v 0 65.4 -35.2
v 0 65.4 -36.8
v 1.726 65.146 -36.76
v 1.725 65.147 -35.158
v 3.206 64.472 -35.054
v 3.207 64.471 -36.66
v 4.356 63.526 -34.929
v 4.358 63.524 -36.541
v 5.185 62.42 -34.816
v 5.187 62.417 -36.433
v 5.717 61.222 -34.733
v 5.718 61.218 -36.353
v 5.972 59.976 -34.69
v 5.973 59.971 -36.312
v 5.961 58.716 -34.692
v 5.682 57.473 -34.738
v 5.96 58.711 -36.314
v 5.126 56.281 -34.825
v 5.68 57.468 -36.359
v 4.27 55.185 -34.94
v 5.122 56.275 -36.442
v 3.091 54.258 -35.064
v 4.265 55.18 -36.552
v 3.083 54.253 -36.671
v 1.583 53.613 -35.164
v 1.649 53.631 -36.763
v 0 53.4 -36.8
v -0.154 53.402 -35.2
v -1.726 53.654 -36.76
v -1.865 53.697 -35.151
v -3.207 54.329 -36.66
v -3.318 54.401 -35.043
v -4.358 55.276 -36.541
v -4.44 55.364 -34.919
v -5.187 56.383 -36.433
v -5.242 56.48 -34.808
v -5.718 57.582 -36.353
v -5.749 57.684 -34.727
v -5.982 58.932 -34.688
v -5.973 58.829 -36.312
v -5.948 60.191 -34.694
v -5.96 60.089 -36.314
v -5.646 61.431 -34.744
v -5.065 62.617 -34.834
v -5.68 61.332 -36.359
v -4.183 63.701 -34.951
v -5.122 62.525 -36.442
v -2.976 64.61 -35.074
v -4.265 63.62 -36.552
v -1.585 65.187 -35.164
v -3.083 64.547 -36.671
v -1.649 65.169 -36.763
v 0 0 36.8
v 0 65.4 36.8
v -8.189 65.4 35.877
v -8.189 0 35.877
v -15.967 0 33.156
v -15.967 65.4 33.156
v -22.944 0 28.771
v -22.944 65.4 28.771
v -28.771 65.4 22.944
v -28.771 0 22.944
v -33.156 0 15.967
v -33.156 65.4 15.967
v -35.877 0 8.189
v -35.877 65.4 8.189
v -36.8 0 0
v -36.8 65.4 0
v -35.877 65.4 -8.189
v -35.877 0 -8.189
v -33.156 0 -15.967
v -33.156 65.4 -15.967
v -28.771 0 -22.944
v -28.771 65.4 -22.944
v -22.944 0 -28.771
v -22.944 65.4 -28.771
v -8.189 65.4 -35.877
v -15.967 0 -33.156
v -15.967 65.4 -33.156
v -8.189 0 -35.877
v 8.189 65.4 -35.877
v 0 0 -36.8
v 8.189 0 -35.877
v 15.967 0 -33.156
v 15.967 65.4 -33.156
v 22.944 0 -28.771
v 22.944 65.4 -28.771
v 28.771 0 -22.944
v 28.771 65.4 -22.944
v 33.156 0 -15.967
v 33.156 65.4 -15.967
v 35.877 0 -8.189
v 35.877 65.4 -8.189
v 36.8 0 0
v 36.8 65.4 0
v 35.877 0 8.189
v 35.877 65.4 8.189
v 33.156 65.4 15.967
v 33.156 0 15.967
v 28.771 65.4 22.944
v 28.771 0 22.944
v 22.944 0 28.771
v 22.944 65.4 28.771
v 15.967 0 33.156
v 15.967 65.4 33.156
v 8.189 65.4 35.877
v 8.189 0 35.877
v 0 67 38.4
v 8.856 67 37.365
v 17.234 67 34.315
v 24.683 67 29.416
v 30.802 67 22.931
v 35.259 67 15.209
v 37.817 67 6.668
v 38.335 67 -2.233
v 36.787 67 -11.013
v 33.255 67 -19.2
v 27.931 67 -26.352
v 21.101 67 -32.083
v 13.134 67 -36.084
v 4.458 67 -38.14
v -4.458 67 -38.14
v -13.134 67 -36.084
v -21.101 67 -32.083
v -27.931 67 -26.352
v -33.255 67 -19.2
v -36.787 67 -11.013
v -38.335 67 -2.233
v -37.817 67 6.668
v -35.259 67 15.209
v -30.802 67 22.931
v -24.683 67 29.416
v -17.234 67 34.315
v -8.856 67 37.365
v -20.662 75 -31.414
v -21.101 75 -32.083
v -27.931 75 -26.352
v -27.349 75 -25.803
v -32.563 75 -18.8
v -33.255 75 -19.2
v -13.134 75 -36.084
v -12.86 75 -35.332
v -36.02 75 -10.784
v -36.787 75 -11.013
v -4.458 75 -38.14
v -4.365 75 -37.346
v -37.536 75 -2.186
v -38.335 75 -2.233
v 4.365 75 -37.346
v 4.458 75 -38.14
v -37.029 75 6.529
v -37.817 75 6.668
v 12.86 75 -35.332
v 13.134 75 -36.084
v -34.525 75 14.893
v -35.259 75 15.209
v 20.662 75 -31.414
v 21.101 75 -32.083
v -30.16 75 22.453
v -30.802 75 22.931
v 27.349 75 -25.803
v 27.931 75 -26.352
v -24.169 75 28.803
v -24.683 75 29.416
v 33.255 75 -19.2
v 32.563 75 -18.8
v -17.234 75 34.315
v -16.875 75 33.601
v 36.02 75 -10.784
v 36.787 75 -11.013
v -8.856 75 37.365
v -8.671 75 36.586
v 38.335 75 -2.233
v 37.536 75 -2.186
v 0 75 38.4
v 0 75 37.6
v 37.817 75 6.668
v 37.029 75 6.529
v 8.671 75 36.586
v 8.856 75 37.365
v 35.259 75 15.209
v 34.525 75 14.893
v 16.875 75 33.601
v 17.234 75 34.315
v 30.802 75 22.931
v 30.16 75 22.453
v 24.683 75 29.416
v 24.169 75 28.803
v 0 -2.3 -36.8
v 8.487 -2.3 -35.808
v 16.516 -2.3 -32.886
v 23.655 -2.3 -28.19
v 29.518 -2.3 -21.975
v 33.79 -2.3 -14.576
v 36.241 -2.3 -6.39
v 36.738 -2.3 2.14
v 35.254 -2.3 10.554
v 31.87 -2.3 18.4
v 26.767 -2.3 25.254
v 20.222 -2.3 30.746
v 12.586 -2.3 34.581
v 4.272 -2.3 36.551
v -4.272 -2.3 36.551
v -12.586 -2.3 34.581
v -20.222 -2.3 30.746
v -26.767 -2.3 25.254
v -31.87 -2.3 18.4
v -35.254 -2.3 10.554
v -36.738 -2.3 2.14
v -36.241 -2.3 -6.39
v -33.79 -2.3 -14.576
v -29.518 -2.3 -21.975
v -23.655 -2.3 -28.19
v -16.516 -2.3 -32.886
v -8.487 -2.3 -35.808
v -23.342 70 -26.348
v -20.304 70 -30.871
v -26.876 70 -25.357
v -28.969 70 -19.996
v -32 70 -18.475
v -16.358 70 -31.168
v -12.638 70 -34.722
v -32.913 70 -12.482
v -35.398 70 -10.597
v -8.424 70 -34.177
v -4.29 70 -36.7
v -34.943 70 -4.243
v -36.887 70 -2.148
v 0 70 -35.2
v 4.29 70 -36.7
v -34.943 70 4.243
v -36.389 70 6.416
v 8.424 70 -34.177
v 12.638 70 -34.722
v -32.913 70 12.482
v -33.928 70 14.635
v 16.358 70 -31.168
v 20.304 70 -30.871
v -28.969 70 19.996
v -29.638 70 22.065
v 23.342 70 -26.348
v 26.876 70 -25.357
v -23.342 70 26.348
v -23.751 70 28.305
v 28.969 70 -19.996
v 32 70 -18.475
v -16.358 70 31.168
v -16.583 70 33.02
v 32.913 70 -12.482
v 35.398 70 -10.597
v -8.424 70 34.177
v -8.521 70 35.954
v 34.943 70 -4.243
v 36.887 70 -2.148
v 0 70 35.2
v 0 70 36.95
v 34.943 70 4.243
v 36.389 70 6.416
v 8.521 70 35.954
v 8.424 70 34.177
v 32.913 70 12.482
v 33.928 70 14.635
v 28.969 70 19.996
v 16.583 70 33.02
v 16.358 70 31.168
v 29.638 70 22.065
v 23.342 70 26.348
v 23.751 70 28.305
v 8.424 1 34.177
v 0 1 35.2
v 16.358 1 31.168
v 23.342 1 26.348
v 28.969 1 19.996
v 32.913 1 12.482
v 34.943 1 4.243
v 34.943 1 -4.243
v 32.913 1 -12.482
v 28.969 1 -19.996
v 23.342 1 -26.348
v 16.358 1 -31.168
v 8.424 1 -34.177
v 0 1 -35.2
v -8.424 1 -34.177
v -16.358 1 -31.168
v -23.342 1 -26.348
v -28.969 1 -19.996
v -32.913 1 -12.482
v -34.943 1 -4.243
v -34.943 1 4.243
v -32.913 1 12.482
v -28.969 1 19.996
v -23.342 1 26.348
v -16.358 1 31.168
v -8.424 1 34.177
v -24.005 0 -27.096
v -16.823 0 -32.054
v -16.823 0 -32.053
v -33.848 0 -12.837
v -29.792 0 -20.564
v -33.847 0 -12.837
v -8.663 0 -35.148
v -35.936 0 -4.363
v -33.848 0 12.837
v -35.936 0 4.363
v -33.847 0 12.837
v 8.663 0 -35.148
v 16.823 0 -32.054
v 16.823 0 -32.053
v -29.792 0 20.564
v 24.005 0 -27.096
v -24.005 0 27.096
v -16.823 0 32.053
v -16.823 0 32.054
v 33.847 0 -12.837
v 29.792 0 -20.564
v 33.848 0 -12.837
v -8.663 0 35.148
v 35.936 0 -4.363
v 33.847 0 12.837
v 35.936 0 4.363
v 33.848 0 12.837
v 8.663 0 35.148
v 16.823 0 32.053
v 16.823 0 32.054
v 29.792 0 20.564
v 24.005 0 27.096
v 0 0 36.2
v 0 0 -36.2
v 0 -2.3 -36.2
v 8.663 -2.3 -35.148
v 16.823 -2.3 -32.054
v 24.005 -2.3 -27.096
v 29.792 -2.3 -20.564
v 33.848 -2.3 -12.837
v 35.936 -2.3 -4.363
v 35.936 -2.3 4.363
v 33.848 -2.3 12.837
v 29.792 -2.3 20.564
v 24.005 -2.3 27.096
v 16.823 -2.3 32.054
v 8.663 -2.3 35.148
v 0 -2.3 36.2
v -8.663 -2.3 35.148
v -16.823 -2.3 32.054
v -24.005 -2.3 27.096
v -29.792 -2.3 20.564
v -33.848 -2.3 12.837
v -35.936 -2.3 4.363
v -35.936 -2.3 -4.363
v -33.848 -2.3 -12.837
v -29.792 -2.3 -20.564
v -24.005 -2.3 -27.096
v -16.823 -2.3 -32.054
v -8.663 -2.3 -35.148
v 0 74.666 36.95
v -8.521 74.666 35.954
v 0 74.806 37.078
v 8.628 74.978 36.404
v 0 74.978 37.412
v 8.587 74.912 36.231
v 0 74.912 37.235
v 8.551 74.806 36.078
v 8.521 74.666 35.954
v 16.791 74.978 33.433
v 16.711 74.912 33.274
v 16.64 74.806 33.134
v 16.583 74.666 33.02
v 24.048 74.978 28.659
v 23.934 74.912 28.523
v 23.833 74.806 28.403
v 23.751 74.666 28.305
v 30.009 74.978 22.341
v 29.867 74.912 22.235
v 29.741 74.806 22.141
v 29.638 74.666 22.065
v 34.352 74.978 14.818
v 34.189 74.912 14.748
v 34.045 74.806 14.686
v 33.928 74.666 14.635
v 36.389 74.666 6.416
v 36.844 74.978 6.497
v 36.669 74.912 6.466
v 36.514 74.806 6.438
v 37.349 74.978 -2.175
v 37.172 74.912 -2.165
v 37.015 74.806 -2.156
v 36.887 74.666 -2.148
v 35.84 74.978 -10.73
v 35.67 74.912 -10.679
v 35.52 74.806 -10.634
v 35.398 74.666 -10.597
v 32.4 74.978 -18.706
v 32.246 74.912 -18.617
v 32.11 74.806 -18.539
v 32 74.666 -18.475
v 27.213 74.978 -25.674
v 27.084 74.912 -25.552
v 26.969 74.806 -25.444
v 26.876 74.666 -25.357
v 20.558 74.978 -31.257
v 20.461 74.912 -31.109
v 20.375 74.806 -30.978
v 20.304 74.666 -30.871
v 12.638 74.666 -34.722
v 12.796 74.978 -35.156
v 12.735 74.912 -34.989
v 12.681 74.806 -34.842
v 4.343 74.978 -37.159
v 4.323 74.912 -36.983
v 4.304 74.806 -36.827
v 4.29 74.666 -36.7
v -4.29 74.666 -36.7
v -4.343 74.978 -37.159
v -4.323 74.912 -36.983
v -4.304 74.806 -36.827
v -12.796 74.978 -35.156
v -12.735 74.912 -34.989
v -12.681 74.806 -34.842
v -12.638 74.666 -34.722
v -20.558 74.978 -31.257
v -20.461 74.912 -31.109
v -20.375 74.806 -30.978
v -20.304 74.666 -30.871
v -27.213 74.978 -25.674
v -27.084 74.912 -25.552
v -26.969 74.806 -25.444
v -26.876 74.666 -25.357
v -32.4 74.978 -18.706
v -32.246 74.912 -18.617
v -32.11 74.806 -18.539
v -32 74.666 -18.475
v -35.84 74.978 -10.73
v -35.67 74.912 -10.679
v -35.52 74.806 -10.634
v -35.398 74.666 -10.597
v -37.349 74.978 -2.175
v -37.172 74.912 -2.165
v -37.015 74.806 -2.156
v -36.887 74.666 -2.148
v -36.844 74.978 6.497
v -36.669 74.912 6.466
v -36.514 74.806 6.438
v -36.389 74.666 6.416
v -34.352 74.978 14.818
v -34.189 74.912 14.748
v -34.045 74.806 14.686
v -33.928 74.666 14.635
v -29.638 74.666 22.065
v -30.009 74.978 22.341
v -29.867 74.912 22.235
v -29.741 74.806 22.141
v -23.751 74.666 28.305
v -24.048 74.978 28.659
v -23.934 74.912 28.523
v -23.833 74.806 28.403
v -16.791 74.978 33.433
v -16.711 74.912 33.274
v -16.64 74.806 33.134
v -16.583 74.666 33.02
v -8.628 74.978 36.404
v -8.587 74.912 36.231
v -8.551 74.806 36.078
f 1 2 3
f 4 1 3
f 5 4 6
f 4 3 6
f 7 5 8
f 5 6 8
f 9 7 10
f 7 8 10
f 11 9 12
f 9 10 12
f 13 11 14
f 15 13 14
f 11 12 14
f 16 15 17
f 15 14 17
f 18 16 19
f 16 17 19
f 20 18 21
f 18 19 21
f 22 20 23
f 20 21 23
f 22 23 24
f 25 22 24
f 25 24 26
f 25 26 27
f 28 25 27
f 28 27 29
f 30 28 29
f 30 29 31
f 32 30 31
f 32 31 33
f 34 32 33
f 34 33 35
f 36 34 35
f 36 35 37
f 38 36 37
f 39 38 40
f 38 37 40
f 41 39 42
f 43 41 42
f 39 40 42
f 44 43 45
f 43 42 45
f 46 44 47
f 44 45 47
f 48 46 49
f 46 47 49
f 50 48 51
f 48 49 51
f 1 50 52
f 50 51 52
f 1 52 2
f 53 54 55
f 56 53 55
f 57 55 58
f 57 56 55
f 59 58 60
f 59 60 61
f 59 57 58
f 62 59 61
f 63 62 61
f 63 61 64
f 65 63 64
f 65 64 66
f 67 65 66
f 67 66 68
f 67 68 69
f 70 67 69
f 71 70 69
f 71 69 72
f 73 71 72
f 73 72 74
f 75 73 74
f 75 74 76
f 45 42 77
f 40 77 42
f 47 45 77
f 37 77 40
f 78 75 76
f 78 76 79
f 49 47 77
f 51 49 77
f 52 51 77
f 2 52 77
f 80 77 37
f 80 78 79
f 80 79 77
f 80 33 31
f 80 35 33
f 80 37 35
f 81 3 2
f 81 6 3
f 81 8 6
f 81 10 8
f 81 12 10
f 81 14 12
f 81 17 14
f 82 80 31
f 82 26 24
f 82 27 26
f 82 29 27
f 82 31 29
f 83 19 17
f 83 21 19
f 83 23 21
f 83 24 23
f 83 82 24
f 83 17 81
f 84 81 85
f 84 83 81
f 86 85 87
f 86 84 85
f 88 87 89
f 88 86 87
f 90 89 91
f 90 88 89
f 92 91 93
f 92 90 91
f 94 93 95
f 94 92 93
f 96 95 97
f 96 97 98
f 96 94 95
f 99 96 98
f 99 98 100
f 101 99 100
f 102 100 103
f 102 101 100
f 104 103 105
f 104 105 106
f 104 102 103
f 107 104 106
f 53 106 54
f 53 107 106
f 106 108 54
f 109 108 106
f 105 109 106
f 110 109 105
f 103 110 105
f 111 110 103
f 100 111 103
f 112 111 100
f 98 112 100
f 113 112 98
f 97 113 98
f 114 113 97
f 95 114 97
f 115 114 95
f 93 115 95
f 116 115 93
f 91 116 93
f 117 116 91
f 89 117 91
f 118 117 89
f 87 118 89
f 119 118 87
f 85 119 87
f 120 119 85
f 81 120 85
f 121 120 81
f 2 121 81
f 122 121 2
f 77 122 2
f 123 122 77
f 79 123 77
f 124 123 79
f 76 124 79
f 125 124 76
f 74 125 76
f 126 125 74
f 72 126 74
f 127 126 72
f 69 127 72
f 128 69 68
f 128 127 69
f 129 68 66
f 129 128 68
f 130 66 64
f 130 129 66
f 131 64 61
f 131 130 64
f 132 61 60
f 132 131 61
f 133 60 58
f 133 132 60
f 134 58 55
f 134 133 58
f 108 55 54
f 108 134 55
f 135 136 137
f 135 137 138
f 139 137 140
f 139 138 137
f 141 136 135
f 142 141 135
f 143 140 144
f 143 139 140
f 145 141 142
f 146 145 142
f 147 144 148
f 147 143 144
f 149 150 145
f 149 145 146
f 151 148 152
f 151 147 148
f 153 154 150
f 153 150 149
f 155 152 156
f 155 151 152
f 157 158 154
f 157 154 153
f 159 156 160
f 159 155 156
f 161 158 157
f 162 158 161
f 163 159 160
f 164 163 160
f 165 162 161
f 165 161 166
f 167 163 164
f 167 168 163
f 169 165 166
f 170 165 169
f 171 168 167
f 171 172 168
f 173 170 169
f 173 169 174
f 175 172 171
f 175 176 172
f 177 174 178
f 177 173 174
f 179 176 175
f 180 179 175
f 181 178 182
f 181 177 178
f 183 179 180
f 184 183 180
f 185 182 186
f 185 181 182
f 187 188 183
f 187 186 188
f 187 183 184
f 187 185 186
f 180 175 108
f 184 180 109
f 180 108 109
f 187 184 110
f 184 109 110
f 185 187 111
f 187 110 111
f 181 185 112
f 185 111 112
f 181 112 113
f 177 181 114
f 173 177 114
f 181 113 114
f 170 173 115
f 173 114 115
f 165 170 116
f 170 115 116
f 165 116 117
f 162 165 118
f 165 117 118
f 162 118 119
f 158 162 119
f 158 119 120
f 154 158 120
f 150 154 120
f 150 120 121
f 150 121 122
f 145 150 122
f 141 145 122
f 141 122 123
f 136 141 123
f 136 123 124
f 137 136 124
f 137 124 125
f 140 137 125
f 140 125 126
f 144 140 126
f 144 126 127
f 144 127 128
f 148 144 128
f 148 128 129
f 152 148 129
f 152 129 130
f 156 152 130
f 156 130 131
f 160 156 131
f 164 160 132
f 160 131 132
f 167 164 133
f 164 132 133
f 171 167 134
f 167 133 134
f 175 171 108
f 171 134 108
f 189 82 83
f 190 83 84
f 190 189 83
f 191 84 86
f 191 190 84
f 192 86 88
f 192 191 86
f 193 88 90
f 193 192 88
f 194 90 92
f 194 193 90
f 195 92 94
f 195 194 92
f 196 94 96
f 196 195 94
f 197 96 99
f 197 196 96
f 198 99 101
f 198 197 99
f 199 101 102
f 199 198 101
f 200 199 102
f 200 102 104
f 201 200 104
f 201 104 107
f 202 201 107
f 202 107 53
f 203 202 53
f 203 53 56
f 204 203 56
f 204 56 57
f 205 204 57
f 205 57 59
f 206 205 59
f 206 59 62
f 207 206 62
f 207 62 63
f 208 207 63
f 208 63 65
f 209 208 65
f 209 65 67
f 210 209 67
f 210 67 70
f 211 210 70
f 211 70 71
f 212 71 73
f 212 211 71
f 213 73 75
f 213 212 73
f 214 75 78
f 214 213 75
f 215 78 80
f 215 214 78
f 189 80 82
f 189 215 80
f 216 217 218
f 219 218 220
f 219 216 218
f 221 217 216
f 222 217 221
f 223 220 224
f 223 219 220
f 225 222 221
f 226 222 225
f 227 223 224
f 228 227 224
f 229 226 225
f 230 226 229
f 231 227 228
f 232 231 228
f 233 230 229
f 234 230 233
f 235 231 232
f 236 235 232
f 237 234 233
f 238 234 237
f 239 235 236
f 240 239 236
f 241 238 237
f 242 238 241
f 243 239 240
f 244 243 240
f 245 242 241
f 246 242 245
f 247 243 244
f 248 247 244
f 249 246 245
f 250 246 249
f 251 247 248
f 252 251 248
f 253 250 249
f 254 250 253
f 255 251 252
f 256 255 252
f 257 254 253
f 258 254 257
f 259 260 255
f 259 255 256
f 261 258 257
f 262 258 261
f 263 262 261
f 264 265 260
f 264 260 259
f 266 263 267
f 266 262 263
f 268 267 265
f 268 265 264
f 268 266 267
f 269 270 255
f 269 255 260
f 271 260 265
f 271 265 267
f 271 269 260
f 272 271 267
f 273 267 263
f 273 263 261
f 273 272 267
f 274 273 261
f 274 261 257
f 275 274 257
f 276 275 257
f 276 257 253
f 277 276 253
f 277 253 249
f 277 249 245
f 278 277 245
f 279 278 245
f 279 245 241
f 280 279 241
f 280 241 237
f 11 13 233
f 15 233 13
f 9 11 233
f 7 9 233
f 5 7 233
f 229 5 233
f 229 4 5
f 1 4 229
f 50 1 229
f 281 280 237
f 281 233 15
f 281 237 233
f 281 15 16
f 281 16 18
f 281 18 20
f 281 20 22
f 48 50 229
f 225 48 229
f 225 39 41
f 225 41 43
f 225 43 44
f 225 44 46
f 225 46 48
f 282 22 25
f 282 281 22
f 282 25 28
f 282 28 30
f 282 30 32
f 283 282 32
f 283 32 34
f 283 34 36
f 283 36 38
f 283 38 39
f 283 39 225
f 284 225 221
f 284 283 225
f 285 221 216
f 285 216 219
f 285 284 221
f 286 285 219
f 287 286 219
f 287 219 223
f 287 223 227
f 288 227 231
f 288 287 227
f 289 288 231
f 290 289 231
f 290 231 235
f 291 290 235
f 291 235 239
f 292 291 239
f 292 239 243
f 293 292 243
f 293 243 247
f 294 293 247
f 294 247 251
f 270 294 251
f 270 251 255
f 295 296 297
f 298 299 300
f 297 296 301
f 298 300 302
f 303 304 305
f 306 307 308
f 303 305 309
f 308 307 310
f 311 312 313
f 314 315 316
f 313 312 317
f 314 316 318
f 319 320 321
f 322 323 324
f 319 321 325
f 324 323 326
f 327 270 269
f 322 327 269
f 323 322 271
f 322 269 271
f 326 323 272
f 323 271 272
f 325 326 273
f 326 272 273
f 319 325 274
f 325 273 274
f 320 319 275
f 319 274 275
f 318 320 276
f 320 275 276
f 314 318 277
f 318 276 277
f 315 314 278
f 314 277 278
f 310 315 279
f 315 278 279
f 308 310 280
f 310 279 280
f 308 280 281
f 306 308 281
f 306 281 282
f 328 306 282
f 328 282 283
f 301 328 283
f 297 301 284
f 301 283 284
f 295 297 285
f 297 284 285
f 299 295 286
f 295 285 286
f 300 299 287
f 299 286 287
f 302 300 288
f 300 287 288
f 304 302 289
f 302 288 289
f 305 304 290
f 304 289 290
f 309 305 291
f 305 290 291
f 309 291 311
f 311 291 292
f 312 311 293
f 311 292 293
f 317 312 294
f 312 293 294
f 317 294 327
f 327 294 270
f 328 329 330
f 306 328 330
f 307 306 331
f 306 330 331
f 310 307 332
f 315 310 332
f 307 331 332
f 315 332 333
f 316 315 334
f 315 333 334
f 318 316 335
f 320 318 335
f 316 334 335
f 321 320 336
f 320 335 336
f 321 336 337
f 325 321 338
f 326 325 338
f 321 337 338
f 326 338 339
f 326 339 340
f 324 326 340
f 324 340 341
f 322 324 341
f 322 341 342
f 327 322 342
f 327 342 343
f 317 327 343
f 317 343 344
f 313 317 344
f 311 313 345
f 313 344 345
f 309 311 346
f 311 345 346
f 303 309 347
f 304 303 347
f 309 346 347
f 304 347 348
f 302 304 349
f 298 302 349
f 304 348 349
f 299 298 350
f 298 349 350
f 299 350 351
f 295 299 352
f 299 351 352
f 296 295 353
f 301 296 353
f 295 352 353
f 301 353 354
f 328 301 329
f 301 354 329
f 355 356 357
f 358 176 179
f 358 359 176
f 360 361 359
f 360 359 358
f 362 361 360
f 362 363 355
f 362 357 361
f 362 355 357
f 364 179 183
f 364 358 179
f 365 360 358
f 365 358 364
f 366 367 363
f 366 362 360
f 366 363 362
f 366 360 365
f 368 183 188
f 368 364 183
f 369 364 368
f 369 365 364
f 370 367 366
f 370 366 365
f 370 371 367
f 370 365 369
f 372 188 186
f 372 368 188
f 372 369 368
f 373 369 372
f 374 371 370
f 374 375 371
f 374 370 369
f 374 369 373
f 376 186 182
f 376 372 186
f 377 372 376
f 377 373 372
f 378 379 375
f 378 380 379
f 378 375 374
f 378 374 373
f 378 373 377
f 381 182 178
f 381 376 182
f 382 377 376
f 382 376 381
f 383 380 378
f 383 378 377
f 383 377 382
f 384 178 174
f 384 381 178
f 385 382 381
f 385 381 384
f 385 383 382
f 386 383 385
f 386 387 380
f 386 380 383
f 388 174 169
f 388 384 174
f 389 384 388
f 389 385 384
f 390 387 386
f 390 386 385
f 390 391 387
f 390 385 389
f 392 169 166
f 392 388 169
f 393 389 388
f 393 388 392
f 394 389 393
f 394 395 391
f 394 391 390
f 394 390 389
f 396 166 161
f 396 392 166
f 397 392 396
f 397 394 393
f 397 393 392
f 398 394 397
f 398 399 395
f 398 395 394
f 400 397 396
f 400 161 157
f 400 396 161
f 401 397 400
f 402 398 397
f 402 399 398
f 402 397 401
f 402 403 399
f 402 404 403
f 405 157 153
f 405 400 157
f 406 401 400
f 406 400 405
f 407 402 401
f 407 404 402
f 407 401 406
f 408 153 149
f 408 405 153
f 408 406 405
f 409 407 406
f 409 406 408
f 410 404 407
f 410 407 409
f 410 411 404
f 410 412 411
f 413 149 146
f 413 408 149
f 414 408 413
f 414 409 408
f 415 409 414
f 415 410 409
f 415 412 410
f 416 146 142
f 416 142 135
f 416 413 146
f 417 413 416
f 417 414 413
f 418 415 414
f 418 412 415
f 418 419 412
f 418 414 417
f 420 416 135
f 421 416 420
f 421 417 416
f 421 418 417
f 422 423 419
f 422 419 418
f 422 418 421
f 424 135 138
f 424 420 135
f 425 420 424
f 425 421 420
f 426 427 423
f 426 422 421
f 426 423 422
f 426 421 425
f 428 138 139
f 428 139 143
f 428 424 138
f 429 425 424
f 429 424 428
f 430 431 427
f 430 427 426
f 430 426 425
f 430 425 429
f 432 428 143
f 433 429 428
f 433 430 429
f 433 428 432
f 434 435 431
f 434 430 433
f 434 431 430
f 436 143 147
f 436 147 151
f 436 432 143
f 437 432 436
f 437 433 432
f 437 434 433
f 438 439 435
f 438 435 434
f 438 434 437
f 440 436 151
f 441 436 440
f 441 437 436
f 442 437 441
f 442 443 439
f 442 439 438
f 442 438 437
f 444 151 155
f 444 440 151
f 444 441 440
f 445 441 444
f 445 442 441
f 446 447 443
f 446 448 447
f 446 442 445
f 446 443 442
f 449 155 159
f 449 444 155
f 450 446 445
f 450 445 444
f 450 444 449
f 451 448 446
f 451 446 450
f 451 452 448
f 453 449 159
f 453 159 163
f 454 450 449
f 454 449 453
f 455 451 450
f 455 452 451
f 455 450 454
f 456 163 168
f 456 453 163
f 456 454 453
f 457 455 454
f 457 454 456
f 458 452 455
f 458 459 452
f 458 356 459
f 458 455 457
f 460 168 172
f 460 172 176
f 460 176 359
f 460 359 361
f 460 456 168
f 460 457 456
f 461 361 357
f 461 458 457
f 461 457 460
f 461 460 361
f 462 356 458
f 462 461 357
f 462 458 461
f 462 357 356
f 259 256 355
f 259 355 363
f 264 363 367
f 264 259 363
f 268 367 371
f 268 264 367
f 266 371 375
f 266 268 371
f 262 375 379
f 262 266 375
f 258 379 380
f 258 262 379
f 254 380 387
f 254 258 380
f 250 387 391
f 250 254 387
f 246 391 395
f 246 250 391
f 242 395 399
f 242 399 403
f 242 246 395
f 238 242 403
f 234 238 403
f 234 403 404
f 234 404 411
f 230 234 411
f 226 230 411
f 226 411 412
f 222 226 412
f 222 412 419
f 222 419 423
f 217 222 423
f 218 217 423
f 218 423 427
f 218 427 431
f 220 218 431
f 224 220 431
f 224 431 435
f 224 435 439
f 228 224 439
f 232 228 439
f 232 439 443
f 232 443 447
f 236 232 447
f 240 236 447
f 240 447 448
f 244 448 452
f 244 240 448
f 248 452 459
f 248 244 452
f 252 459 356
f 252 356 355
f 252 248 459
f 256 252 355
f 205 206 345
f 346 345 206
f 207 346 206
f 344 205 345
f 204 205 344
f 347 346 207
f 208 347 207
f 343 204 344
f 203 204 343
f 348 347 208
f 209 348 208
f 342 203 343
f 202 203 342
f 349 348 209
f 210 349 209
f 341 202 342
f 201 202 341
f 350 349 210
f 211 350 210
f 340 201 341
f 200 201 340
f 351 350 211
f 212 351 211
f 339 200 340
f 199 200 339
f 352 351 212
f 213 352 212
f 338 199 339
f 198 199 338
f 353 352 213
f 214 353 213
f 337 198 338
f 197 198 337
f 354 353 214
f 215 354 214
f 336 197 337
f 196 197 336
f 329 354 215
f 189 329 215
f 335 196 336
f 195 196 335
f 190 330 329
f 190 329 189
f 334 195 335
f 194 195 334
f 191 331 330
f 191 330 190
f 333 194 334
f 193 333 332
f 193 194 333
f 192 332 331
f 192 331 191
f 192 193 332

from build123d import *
from build123d.topology import SkipClean

# Parameters (mm, degrees)
SKETCH1_R                = 36.8
SKETCH1_R_2              = 35.2
BOSS_EXTRUDE1_DEPTH      = 70
BOSS_EXTRUDE2_DEPTH      = 5
BOSS_EXTRUDE2_DEPTH_BACK = 5
SKETCH2_R                = 38.4
SKETCH2_R_2              = 36.8
CHAMFER1_SIZE            = 2
FILLET1_R                = 0.8
BOSS_EXTRUDE3_START      = 2.3
SKETCH3_R                = 36.8
SKETCH3_R_2              = 36.2
BOSS_EXTRUDE3_DEPTH      = 2.3
CHAMFER2_SIZE            = 1
SKETCH5_R                = 36.95
CUT_EXTRUDE1_DEPTH       = 10
SKETCH6_R                = 6
CUT_EXTRUDE2_DEPTH       = 10


# Some blends are built 0.0001 mm under size
with BuildPart() as part:
    # Sketch1 → Boss-Extrude1 (new body)
    with BuildSketch(Plane(origin=(0, 0, 0), x_dir=(1, 0, 0), z_dir=(0, 1, 0))):
        with Locations(Location((0, 0, 0), (0, 0, 270))):
            Circle(SKETCH1_R)
        with Locations(Location((0, 0, 0), (0, 0, 270))):
            Circle(SKETCH1_R_2, mode=Mode.SUBTRACT)
    extrude(amount=BOSS_EXTRUDE1_DEPTH)

    # Sketch2 → Boss-Extrude2 (add, two sides: drawn at the far end of the back side and taken through both)
    with BuildSketch(Plane(origin=(0, 70, 0), x_dir=(1, 0, 0), z_dir=(0, 1, 0)).offset(-BOSS_EXTRUDE2_DEPTH_BACK)):
        with Locations(Location((0, 0, 0), (0, 0, 270))):
            Circle(SKETCH2_R)
        with Locations(Location((0, 0, 0), (0, 0, 270))):
            Circle(SKETCH2_R_2, mode=Mode.SUBTRACT)
    extrude(amount=BOSS_EXTRUDE2_DEPTH + BOSS_EXTRUDE2_DEPTH_BACK)

    # Chamfer1
    # the kernel refuses this chamfer: 2 mm, written as the material it takes off along each edge
    with BuildSketch(Plane(origin=(0, 65, 0), x_dir=(0, 0, 1), z_dir=(-1, 0, 0))) as chamfer1_piece_1_section:
        Polygon((38.4 - CHAMFER1_SIZE, 0), (38.4, CHAMFER1_SIZE), (38.4, 0), align=None)
    chamfer1_piece_1 = revolve(axis=Axis((0, 65, 0), (0, 1, 0)), mode=Mode.PRIVATE)
    chamfer1_piece_1 = chamfer1_piece_1 - Plane(origin=(0, 66.172330508, 0), x_dir=(0, 0, 1), z_dir=(0, -1, 0)) * Cylinder(36.8, 154, mode=Mode.PRIVATE)
    add(chamfer1_piece_1, mode=Mode.SUBTRACT)

    # Fillet1
    fillet1_edges = [part.edges().sort_by_distance(p)[0] for p in [
        (0, 75, -36.8),
    ]]
    fillet(fillet1_edges, radius=FILLET1_R)

    # Sketch3 → Boss-Extrude3 (add)
    with BuildSketch(Plane.XZ.offset(BOSS_EXTRUDE3_START)):
        with Locations(Location((0, 0, 0), (0, 0, 270))):
            Circle(SKETCH3_R)
        with Locations(Location((0, 0, 0), (0, 0, 270))):
            Circle(SKETCH3_R_2, mode=Mode.SUBTRACT)
    extrude(amount=-BOSS_EXTRUDE3_DEPTH)

    # Chamfer2
    chamfer2_edges = [part.edges().sort_by_distance(p)[0] for p in [
        (0, 0, -35.2),
    ]]
    chamfer(chamfer2_edges, length=CHAMFER2_SIZE - 0.0001)  # a hair under: the kernel refuses the full size

    # Sketch5 → Cut-Extrude1 (cut)
    with BuildSketch(Plane(origin=(0, 70, 0), x_dir=(1, 0, 0), z_dir=(0, 1, 0))):
        with Locations(Location((0, 0, 0), (0, 0, 270))):
            Circle(SKETCH5_R)
    extrude(amount=CUT_EXTRUDE1_DEPTH, mode=Mode.SUBTRACT)

    # Sketch6 → Cut-Extrude2 (cut)
    with SkipClean():  # the faces are left unmerged after this step: merging them gives an invalid solid
        with BuildSketch(Plane(origin=(0, 0, -36.8), x_dir=(-1, 0, 0), z_dir=(0, 0, -1))):
            with Locations(Location((0, 59.4, 0), (0, 0, 90))):
                Circle(SKETCH6_R)
        extrude(amount=-CUT_EXTRUDE2_DEPTH, mode=Mode.SUBTRACT)


solid = part.part
